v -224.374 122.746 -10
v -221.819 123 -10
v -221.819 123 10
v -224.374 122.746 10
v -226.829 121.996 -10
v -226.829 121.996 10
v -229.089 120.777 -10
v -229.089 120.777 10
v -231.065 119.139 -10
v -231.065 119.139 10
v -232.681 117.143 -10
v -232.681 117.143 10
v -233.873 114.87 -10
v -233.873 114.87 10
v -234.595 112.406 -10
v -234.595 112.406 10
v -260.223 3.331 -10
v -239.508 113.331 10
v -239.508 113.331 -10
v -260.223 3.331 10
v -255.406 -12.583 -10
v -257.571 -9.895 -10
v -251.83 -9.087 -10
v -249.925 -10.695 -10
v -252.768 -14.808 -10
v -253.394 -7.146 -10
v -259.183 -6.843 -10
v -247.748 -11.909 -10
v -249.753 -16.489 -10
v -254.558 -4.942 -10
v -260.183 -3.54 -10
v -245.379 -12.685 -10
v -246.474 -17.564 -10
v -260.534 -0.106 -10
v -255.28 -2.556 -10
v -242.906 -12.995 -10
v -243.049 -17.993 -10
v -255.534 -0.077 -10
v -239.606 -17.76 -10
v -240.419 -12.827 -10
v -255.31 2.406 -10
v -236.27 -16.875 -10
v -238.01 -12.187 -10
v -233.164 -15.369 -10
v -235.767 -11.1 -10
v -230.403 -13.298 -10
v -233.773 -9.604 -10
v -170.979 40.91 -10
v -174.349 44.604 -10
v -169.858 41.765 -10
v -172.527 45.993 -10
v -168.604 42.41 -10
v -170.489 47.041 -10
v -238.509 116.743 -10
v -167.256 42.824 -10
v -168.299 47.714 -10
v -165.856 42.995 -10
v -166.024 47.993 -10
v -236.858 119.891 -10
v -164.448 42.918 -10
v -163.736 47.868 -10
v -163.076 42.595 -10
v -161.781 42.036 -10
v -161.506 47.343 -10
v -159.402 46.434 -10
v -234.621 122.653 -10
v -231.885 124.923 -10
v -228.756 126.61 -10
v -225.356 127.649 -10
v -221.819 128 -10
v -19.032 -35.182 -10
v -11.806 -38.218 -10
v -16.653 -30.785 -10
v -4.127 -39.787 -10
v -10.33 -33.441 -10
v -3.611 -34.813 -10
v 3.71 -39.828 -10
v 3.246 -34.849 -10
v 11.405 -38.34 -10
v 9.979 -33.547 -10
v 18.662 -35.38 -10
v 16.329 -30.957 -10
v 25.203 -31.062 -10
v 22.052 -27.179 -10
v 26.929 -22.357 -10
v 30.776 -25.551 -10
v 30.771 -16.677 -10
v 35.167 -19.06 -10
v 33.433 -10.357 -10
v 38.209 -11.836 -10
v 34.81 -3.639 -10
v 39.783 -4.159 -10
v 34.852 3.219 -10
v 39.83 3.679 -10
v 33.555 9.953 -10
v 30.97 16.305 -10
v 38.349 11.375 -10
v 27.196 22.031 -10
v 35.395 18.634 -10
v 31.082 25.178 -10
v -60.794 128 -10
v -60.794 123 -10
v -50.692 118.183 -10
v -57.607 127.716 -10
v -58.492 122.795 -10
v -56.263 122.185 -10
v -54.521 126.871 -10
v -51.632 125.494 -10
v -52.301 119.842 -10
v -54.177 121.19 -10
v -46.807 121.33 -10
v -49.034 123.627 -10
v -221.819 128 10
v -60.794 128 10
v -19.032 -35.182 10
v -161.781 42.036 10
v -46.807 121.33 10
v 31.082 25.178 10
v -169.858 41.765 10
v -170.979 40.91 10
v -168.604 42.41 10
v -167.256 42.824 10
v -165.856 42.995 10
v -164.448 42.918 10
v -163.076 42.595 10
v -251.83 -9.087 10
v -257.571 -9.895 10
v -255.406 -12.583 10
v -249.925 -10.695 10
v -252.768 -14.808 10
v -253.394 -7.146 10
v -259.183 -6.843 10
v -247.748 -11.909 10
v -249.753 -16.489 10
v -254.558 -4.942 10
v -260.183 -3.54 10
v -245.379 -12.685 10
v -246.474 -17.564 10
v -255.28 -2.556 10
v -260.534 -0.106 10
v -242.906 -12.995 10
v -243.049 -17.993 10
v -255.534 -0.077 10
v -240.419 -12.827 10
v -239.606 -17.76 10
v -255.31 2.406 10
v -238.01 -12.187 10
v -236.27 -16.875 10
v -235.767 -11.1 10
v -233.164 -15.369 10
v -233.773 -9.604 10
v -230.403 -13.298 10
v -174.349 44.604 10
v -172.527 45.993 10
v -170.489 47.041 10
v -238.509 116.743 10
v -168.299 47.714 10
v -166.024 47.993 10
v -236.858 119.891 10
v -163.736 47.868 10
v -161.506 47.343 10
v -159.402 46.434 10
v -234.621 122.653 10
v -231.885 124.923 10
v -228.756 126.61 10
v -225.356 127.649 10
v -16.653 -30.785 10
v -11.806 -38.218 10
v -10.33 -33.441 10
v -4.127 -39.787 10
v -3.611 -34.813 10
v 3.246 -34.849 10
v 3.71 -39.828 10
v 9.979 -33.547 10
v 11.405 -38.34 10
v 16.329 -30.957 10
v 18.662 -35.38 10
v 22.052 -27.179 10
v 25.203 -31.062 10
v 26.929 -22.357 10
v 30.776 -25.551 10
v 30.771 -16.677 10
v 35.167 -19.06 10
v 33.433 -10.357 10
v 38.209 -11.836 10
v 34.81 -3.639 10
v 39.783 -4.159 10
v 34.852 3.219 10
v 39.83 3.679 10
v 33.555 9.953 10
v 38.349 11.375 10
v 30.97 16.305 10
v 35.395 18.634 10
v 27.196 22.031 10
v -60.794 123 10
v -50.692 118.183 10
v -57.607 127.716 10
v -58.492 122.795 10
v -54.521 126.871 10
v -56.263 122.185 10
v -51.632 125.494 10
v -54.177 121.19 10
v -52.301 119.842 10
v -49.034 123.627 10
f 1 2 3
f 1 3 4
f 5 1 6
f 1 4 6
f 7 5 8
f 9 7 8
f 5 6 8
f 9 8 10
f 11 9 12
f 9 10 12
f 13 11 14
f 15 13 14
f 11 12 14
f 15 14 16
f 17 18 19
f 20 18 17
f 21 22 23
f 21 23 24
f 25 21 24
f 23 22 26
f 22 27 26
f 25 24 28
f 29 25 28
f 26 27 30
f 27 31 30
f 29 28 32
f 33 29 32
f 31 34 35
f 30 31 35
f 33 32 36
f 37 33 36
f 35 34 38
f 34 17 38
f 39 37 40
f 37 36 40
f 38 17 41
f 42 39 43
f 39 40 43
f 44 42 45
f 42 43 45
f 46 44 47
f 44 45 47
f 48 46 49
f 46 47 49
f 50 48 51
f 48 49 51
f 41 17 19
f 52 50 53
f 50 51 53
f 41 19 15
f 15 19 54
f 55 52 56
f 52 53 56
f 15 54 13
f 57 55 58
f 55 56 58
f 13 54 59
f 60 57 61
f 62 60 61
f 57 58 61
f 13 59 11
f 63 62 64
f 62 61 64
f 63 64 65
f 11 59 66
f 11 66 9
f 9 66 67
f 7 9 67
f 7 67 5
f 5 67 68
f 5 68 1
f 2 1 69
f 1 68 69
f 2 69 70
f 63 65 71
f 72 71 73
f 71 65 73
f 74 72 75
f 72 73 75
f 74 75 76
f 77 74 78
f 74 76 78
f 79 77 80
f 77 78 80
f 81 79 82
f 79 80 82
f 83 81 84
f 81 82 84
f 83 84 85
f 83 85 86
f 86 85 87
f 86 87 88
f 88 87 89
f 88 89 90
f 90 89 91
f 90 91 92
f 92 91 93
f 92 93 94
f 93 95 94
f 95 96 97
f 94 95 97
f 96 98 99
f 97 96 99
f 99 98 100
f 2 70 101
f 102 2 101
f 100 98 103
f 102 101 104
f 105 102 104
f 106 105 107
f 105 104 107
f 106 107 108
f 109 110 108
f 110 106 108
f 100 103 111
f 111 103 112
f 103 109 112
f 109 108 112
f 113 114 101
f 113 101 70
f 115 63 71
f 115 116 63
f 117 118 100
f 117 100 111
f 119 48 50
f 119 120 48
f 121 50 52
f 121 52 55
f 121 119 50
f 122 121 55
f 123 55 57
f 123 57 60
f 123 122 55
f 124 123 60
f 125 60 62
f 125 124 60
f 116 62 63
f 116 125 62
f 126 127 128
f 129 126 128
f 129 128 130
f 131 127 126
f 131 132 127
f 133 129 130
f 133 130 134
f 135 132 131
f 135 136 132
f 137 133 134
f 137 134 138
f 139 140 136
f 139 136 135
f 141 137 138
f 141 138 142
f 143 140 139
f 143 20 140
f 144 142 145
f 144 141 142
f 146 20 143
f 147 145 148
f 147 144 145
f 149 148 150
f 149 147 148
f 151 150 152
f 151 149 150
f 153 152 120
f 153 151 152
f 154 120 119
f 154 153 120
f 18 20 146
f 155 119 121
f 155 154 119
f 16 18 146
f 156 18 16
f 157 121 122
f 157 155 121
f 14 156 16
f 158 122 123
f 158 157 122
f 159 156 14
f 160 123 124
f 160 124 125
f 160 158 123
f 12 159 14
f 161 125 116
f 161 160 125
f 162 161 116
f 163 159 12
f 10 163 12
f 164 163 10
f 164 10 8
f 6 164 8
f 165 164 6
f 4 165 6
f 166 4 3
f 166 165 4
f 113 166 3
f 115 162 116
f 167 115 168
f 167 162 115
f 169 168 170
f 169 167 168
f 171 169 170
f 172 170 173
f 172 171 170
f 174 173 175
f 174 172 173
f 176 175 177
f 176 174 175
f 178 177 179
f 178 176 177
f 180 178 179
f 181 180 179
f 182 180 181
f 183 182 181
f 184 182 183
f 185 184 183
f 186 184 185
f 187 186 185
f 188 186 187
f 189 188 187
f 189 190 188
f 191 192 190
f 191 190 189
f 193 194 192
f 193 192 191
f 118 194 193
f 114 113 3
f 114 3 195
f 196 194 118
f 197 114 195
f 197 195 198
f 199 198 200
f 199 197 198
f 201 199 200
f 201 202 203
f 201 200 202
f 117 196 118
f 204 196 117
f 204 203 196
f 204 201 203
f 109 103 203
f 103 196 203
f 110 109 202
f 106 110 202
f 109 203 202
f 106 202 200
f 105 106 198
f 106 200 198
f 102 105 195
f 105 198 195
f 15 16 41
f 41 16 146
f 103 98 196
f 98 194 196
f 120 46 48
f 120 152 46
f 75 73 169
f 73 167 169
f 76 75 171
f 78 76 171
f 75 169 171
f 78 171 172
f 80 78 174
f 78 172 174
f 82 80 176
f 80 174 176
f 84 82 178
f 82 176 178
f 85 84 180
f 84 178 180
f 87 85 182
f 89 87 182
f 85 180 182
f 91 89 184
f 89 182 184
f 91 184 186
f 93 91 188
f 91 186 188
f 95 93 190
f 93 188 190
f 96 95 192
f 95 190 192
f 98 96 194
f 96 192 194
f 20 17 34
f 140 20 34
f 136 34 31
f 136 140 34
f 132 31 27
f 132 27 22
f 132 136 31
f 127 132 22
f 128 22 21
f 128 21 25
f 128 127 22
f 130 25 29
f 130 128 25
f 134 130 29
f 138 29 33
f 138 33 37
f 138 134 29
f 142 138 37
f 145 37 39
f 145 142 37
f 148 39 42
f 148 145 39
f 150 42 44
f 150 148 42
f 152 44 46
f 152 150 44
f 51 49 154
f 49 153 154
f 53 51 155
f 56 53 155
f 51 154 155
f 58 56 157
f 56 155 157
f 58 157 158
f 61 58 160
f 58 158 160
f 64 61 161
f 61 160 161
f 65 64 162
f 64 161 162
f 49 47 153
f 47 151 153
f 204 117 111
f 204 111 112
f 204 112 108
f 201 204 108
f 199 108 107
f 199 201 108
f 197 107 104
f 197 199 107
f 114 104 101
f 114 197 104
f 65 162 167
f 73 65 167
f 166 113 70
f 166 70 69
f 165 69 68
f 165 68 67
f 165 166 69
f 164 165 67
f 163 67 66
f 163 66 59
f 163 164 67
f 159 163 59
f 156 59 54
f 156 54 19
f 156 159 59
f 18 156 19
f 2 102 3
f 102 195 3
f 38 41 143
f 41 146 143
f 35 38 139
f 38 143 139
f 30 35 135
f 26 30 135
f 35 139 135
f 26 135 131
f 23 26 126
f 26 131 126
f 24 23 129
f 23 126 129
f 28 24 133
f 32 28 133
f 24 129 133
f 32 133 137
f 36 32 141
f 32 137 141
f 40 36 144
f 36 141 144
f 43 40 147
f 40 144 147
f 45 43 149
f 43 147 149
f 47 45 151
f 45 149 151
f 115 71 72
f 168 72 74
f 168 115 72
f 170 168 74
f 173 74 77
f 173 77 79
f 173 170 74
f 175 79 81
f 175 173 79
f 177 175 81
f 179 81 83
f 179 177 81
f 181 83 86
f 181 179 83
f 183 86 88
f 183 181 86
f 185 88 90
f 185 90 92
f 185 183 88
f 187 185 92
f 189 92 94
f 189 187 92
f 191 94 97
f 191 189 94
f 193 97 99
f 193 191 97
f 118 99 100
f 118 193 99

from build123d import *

# Parameters (mm, degrees)
EXTRUDE_THIN1_DEPTH = 10


with BuildPart() as part:
    # Sketch2 → Extrude-Thin1 (new, symmetric)
    with BuildSketch(Plane.XY):
        with BuildLine():
            Line((-161.781383655, 42.036480739), (-19.031512561, -35.182403693))
            ThreePointArc((-19.031512561, -35.182403693), (30.775705763, -25.551045669), (31.081700633, 25.177924573))
            Line((31.081700633, 25.177924573), (-46.806938551, 121.330066058))
            ThreePointArc((-46.806938551, 121.330066058), (-53.045839261, 126.247171893), (-60.793703836, 128))
            Line((-60.793703836, 128), (-221.819075448, 128))
            ThreePointArc((-221.819075448, 128), (-233.30903916, 123.855711237), (-239.508144262, 113.331192655))
            Line((-239.508144262, 113.331192655), (-260.223264765, 3.331192655))
            ThreePointArc((-260.223264765, 3.331192655), (-251.300991125, -15.720792041), (-230.403245845, -13.29812203))
            Line((-230.403245845, -13.29812203), (-170.979219548, 40.910276458))
            ThreePointArc((-170.979219548, 40.910276458), (-166.559963518, 42.940697498), (-161.781383655, 42.036480739))
        make_face()
        with BuildLine():
            Line((-159.402444585, 46.4342812), (-16.652573491, -30.784603232))
            ThreePointArc((-16.652573491, -30.784603232), (26.928742543, -22.35716496), (27.196488054, 22.030684001))
            Line((27.196488054, 22.030684001), (-50.69215113, 118.182825486))
            ThreePointArc((-50.69215113, 118.182825486), (-55.198023865, 121.734068589), (-60.793703836, 123))
            Line((-60.793703836, 123), (-221.819075448, 123))
            ThreePointArc((-221.819075448, 123), (-230.117382574, 120.00690256), (-234.594514036, 112.405861362))
            Line((-234.594514036, 112.405861362), (-255.309634539, 2.405861362))
            ThreePointArc((-255.309634539, 2.405861362), (-248.865770243, -11.353905363), (-233.772954208, -9.604199244))
            Line((-233.772954208, -9.604199244), (-174.348927911, 44.604199244))
            ThreePointArc((-174.348927911, 44.604199244), (-167.167636862, 47.903633434), (-159.402444585, 46.4342812))
        make_face(mode=Mode.SUBTRACT)
    extrude(amount=EXTRUDE_THIN1_DEPTH, both=True)


solid = part.part
